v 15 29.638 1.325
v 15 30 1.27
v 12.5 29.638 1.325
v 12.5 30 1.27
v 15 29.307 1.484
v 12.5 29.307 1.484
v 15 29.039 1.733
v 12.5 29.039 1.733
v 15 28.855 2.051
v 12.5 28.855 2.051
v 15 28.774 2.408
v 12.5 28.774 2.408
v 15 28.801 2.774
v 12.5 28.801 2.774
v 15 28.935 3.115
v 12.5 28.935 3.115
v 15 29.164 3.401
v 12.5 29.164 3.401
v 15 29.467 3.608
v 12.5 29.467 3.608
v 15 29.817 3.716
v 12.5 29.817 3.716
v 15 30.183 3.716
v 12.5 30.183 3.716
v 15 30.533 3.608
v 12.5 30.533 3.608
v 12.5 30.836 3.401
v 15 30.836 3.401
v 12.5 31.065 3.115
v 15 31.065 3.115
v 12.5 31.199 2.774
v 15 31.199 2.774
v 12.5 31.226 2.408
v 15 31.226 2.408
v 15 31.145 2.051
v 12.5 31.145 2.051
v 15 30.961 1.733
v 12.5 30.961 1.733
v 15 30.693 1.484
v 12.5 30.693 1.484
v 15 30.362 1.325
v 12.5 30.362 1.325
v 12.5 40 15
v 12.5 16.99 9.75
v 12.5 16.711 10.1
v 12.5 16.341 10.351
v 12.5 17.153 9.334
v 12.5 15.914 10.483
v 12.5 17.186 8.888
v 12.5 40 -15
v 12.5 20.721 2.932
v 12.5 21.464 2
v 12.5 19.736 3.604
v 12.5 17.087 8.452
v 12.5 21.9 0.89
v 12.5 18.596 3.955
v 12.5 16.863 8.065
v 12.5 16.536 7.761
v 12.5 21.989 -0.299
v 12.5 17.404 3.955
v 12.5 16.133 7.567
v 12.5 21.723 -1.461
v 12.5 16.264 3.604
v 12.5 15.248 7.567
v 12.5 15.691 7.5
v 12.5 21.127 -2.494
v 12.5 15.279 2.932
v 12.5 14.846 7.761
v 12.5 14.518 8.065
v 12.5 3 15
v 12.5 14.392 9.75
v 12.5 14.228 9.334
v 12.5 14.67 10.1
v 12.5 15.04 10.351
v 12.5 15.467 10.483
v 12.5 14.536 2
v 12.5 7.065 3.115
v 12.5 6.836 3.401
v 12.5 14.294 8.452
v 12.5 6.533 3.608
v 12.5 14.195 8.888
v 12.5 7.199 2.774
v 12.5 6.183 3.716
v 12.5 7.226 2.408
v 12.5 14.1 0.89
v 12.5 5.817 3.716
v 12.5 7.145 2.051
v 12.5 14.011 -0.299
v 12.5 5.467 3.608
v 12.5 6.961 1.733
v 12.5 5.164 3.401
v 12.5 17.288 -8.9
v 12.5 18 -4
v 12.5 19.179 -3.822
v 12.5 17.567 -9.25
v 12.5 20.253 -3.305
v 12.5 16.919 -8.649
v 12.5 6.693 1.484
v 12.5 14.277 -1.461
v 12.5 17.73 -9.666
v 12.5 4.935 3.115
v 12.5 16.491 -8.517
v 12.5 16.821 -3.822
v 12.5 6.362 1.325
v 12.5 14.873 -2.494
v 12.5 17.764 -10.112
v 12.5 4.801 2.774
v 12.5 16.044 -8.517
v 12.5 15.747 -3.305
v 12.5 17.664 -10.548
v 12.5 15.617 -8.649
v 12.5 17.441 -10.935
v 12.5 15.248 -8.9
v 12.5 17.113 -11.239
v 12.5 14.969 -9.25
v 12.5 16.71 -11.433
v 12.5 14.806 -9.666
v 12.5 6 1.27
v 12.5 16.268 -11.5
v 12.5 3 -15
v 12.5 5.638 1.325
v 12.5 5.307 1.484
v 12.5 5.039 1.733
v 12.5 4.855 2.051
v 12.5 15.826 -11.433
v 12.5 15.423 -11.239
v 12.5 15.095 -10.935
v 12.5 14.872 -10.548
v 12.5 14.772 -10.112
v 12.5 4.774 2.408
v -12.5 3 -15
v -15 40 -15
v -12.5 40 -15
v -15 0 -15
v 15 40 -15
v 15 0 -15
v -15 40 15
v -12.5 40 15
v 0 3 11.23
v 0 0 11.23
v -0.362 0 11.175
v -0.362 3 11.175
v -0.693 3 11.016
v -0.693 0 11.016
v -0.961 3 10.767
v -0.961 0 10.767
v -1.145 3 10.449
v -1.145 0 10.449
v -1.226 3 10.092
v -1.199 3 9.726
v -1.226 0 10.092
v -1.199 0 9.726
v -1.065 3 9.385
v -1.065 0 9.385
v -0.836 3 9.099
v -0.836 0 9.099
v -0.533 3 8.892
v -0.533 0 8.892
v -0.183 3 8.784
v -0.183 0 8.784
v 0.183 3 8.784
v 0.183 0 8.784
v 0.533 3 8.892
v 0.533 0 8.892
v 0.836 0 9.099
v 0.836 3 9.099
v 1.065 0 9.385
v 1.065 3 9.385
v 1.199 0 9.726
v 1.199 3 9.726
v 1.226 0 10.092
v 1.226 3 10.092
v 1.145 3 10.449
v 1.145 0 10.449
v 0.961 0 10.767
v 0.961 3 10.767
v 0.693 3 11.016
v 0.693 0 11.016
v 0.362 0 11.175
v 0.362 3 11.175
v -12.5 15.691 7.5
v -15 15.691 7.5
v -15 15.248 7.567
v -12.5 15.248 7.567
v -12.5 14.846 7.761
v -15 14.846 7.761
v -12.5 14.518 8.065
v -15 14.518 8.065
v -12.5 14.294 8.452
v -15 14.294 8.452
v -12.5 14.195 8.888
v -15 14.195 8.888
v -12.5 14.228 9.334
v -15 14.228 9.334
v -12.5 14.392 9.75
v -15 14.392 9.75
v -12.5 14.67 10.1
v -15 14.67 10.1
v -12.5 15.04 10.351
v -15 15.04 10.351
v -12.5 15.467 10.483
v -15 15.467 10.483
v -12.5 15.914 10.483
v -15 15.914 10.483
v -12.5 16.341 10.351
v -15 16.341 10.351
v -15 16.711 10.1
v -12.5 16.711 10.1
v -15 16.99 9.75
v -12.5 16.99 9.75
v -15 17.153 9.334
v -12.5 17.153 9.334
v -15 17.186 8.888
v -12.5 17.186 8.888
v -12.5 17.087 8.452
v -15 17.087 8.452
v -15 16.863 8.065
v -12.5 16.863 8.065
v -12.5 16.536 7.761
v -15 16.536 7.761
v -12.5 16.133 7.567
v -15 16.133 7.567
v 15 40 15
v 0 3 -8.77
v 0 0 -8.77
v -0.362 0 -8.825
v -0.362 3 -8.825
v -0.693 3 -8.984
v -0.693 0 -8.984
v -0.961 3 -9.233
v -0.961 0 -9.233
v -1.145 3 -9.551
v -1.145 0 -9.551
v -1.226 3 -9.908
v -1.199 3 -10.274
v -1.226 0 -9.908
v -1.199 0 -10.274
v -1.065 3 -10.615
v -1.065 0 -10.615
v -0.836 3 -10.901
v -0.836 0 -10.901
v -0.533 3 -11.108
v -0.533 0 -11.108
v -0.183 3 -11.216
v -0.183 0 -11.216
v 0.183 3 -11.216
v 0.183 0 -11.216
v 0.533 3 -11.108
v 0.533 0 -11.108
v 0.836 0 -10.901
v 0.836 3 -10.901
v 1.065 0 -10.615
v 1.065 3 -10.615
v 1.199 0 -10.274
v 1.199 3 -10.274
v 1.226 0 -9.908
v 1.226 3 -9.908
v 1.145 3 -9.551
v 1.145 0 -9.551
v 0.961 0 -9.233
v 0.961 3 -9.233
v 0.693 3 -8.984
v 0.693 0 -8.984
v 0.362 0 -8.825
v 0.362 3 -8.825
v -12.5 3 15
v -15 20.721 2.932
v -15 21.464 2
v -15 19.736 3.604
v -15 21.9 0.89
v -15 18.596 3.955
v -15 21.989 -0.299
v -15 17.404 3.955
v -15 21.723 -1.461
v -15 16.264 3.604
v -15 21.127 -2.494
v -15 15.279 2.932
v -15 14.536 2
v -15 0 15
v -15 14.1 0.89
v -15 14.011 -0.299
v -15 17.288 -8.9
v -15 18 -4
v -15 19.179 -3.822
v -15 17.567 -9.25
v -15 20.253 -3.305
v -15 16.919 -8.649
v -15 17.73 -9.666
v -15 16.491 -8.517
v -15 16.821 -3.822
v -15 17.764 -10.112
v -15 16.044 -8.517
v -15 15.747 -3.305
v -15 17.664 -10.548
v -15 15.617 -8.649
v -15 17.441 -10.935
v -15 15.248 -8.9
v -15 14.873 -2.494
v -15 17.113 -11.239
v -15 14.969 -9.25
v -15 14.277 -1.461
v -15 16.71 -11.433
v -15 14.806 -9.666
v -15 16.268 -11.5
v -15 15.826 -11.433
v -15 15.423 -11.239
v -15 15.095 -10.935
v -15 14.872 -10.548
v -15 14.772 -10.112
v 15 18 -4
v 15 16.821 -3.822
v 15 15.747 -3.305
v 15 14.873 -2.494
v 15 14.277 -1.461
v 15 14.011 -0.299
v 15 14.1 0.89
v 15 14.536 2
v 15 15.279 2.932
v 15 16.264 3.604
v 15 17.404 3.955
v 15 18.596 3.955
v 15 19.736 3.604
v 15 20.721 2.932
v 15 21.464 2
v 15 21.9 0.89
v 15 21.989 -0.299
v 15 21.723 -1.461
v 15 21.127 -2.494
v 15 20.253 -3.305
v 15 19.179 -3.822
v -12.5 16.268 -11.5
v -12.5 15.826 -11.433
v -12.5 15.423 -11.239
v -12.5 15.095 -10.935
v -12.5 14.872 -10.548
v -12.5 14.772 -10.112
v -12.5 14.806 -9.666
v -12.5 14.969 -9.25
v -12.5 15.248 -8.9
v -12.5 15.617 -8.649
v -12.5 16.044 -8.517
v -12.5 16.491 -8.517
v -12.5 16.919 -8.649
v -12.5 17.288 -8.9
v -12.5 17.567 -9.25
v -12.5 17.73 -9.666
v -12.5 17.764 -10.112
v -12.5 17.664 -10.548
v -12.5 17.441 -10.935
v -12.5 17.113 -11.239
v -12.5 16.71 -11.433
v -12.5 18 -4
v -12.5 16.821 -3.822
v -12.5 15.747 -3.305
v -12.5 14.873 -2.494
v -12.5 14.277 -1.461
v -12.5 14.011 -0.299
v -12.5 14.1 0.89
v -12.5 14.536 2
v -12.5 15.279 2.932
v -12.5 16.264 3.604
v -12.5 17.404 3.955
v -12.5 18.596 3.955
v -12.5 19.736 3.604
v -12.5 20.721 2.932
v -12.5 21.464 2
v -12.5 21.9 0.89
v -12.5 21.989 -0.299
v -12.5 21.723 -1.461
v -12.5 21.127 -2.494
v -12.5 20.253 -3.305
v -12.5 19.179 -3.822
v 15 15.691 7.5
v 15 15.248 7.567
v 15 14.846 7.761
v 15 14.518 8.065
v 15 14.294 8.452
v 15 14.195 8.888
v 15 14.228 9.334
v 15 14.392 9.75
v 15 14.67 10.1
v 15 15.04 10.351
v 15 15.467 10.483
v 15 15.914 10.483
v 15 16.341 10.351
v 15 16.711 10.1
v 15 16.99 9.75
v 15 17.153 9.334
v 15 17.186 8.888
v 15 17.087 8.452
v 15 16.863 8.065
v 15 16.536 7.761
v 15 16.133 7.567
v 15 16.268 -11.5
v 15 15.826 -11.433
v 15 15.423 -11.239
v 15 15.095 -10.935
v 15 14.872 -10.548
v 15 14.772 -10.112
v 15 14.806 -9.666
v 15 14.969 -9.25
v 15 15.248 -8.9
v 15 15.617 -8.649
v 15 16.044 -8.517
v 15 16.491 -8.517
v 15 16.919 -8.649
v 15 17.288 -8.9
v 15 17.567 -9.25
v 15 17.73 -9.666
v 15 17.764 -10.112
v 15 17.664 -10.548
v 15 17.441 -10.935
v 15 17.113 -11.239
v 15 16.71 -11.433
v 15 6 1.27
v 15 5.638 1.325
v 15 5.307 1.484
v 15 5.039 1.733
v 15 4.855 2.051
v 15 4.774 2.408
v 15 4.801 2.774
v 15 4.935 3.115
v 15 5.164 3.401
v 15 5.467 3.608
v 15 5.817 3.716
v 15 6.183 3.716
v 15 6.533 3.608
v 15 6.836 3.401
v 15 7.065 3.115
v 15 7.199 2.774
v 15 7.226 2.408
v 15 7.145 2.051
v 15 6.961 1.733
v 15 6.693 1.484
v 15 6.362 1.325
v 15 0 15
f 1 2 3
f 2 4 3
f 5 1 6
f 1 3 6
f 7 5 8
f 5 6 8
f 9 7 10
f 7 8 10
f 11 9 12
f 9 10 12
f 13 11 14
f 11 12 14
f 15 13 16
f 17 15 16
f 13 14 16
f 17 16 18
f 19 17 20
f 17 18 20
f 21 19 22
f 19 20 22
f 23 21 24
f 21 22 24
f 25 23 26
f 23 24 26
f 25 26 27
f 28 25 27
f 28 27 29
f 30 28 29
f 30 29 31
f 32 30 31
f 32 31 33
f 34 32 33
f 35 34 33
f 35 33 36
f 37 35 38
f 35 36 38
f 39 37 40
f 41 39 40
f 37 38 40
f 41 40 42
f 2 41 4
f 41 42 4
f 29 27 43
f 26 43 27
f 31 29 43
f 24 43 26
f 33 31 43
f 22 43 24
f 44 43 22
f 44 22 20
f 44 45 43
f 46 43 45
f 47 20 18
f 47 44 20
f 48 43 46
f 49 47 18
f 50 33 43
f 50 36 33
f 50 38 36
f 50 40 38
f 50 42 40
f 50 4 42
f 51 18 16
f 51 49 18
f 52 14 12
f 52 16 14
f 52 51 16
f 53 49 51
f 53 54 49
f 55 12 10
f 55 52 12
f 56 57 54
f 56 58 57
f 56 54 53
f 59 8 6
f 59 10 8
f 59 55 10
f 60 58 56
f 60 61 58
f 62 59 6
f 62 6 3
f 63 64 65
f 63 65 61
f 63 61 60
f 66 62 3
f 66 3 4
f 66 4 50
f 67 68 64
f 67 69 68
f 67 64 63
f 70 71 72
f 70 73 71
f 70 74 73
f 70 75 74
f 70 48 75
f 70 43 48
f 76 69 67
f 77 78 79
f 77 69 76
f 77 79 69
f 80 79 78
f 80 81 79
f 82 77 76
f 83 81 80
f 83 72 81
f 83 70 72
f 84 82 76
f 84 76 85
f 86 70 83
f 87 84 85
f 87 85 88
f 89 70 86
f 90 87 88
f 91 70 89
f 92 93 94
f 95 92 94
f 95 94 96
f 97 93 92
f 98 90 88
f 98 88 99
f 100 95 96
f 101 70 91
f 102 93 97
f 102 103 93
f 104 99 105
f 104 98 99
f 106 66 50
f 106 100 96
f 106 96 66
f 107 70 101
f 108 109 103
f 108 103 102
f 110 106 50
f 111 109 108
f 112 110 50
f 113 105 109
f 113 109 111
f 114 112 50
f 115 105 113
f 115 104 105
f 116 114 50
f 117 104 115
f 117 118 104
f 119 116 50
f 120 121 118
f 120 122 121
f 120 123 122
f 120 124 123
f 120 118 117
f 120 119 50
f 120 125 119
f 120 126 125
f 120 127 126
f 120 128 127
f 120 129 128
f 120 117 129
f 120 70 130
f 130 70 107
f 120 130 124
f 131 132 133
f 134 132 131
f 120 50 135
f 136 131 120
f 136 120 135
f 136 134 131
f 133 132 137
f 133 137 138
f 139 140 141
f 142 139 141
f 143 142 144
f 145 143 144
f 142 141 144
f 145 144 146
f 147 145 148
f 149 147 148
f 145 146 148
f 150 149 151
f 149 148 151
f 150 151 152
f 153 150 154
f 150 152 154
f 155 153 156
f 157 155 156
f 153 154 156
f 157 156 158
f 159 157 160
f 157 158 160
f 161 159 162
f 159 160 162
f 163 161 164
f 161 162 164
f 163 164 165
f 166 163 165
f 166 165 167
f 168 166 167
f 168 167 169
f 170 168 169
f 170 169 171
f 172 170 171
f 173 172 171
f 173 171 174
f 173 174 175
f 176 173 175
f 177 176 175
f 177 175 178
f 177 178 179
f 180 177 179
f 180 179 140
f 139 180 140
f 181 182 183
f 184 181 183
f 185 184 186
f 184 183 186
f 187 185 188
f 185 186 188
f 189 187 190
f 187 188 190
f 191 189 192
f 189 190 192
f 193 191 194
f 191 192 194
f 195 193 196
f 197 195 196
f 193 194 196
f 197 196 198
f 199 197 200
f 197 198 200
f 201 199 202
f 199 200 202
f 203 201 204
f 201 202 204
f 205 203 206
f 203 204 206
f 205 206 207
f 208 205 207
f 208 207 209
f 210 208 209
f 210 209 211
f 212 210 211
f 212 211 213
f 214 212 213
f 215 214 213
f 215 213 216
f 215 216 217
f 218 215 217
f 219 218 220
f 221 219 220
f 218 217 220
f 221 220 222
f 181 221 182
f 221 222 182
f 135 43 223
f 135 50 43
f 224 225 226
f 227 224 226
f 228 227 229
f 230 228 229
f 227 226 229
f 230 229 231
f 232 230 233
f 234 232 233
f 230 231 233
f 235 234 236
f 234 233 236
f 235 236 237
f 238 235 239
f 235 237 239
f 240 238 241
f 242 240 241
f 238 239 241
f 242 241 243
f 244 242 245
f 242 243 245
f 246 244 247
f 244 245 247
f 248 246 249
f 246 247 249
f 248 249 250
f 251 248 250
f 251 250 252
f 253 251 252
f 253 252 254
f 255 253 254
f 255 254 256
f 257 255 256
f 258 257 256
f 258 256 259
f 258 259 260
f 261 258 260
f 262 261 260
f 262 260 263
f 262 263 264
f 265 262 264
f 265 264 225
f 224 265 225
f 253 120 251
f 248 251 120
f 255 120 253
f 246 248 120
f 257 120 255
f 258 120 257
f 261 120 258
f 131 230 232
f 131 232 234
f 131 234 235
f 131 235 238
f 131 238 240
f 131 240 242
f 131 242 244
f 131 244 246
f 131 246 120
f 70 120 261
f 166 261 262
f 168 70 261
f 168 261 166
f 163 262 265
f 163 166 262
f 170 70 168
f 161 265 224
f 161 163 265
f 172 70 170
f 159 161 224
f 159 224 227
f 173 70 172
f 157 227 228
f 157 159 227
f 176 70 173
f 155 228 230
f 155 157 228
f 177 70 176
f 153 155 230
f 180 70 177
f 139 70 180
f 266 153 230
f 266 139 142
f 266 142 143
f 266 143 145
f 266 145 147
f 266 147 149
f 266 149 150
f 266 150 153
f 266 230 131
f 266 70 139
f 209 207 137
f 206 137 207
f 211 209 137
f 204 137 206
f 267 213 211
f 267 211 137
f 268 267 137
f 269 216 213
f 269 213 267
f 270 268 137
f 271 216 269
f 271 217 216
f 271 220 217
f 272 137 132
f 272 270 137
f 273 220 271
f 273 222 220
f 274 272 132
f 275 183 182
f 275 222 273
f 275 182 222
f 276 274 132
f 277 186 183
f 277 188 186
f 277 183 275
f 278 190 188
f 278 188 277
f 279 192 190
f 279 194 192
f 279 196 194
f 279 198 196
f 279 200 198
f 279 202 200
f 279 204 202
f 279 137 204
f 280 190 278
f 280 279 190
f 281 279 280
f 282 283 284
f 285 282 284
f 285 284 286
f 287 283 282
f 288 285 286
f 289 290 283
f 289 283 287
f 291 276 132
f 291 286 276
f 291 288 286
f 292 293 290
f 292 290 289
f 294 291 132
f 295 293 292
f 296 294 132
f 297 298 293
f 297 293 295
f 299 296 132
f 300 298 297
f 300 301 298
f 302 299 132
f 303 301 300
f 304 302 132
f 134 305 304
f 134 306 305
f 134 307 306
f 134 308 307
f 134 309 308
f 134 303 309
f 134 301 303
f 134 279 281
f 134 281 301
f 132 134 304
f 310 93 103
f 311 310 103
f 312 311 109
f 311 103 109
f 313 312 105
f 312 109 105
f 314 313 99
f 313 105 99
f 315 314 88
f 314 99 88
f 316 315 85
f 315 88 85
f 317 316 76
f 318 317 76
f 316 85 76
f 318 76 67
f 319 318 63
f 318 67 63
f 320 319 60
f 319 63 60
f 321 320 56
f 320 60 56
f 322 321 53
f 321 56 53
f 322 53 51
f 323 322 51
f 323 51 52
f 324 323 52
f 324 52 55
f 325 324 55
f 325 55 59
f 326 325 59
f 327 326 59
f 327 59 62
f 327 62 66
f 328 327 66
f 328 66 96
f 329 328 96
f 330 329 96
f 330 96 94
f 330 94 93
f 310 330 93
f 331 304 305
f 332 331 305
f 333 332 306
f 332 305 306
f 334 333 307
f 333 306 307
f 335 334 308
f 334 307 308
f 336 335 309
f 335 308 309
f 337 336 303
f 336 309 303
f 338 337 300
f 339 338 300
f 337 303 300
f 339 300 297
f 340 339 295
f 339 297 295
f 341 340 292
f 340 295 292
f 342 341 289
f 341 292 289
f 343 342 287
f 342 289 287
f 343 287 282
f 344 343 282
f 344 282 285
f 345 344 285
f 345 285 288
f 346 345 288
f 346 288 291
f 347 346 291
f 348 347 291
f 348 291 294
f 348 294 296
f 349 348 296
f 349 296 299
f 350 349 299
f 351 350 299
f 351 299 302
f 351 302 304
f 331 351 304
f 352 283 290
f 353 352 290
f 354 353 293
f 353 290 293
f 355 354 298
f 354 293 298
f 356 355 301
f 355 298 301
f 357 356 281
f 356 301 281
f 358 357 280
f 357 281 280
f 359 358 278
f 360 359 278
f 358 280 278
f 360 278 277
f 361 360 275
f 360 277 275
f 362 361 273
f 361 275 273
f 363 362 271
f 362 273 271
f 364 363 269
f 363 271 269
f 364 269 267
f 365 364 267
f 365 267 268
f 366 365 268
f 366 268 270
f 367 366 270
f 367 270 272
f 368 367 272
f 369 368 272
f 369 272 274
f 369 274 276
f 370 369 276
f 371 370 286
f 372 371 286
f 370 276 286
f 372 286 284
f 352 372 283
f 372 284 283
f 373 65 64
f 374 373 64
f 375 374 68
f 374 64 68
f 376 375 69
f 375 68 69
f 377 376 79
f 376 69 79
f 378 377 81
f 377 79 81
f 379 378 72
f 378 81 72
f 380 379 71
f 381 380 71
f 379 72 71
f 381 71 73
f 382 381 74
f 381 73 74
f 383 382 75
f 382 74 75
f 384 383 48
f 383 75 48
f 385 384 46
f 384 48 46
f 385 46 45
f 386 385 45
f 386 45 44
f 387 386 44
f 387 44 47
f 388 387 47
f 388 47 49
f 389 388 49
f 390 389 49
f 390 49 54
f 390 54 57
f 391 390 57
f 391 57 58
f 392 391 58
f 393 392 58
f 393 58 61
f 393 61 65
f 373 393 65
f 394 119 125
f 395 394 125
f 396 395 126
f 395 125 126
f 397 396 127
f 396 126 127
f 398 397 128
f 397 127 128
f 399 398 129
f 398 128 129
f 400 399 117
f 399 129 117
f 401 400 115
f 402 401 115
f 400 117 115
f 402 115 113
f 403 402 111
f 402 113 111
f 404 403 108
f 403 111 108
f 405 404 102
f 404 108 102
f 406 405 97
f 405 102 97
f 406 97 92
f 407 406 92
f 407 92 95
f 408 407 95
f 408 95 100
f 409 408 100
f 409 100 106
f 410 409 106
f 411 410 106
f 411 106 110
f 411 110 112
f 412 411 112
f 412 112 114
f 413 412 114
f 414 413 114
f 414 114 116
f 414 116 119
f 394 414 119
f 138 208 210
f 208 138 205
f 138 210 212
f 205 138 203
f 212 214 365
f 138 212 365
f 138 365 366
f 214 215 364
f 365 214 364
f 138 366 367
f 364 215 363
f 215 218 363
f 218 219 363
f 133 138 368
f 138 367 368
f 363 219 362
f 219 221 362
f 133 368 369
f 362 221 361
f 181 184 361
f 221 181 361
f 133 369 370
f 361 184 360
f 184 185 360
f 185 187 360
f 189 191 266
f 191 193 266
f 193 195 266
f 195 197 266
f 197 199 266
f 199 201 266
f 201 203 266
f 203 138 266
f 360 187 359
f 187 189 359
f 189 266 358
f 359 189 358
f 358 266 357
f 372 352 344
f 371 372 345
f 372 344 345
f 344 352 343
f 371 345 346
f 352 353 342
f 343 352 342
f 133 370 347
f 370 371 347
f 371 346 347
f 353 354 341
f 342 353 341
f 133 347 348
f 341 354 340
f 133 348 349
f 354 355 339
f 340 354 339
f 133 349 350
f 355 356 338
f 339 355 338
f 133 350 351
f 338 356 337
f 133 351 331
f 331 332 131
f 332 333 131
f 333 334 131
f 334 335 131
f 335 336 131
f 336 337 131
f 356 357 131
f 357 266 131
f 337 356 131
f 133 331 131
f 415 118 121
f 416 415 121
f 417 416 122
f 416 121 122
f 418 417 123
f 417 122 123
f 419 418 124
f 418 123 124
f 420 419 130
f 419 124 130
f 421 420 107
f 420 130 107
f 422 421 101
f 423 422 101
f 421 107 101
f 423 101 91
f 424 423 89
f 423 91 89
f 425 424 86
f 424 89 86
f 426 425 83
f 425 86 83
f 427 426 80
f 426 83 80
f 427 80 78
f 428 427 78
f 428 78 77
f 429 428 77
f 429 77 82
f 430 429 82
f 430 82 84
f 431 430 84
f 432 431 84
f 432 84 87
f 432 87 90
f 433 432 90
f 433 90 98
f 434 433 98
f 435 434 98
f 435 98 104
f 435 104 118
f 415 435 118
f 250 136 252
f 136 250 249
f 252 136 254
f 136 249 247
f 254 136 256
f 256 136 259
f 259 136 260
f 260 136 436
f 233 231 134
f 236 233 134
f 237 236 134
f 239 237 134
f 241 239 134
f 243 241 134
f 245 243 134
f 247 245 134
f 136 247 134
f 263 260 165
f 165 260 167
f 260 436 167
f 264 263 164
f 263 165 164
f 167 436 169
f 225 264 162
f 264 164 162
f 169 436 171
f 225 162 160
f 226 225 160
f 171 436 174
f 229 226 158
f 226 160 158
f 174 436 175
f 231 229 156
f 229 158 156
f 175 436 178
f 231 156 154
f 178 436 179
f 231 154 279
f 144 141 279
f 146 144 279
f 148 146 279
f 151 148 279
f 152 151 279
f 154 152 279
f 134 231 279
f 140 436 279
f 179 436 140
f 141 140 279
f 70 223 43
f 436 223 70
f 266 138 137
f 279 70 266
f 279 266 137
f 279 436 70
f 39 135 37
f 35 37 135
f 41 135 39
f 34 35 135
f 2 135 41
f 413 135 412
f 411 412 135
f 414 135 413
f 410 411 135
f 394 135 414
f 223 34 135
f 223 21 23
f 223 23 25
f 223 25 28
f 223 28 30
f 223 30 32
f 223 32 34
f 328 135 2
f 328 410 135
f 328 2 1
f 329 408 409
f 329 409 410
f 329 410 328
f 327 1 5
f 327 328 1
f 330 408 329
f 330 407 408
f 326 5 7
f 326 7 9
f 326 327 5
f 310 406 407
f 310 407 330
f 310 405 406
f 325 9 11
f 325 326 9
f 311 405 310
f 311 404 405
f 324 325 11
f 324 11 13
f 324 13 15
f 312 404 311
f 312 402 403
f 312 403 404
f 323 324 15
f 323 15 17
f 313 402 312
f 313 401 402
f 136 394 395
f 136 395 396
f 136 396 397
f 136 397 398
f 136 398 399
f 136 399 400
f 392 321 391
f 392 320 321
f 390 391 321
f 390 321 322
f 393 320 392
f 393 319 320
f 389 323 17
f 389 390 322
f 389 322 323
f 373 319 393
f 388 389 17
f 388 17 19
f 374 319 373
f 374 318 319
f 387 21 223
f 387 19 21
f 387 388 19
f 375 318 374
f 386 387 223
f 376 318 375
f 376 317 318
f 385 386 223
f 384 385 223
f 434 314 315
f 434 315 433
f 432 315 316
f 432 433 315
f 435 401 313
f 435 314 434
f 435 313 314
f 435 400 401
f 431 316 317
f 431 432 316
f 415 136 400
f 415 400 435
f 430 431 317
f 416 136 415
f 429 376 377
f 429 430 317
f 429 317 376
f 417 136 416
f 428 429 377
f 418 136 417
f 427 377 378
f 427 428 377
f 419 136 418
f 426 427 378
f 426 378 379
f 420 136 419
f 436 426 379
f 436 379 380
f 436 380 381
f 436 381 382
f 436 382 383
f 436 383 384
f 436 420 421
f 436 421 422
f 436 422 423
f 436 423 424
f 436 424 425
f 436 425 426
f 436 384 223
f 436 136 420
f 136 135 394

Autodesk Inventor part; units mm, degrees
ref_plane "YZ Plane" through (0, 0, 0) normal (1, 0, 0) x (0, 1, 0)
ref_plane "XZ Plane" through (0, 0, 0) normal (0, 1, 0) x (-1, 0, 0)
sketch "スケッチ1" plane through (0, 0, 0) normal (0, 1, 0) x (-1, 0, 0)
  line L0 (15, -15) -> (-15, -15)
  line L1 (-15, -15) -> (-15, 15)
  line L2 (-15, 15) -> (15, 15)
  line L3 (15, 15) -> (15, -15)
  line L4 (-15, 15) -> (15, -15) construction
  line L5 (-15, -15) -> (15, 15) construction
  point P0 (0, 0)
  point P1 (0, 0)
  dimension "d0" = 30
  dimension "d1" = 30
extrude "押し出し1" add sketch "スケッチ1" along normal blind 3
sketch "スケッチ2" plane through (0, 3, 0) normal (0, 1, 0) x (1, 0, 0)
  line L0 (-15, -15) -> (15, -15) projected
  line L1 (15, -15) -> (15, 15) projected
  line L2 (15, 15) -> (-15, 15) projected
  line L3 (-15, 15) -> (-15, -15) projected
  line L4 (-15, -15) -> (15, -15) projected
  line L5 (-15, -15) -> (-12.5, -15)
  line L6 (-12.5, -15) -> (-12.5, 15)
  line L7 (-12.5, 15) -> (-15, 15)
  line L8 (-15, 15) -> (-15, -15)
  line L9 (15, -15) -> (15, 15) projected
  line L10 (15, -15) -> (12.5, -15)
  line L11 (12.5, -15) -> (12.5, 15)
  line L12 (12.5, 15) -> (15, 15)
  line L13 (15, 15) -> (15, -15)
  line L14 (15, 15) -> (-15, 15) projected
  point P0 (0, 0)
  point P1 (-12.5, 15)
  dimension "d4" = 2.5
  dimension "d5" = 2.5
extrude "押し出し2" add sketch "スケッチ2" along normal blind 40 from surface at -3 contours L3 L2 L6 L0 | L11 L2 L1 L0
sketch "スケッチ3" plane through (15, 0, 15) normal (1, 0, 0) x (0, 0, -1)
  line L0 (0, 3) -> (30, 3) projected
  line L1 (15, 18) -> (30, 18) construction
  line L2 (30, 40) -> (30, 3) construction
  line L3 (15, 18) -> (-10.0782, 18) construction
  point P0 (15, 0)
  dimension "d8" = 15
  dimension "d50" = 15
hole "穴1" at (15, 18, 0) direction (-1, 0, 0) diameter 8 end through all
sketch "スケッチ6" plane through (0, 3, 0) normal (0, 1, 0) x (1, 0, 0)
  line L0 (12.5, 15) -> (-12.5, 15) projected
  point P0 (0, 0)
  point P1 (0, 10)
  point P2 (0, -10)
  point P3 (0, 15)
  dimension "d41" = 5
  dimension "d42" = 20
hole "穴3" at (0, 3, -10) at (0, 3, 10) direction (0, -1, 0) diameter 2.459 depth 3 thread size "M3x0.5" class "6H" standard "ISO Metric profile"
sketch "スケッチ8" plane through (15, 0, 15) normal (1, 0, 0) x (0, 0, -1)
  circle A0 centre (15, 18) radius 4 projected
  line L0 (12.5, 30) -> (12.5, 6) construction
  point P0 (15, 0)
  dimension "d56" = 24
  dimension "d57" = 12
  dimension "d58" = 2.5
hole "穴4" at (15, 30, 2.5) at (15, 6, 2.5) direction (-1, 0, 0) diameter 2.459 depth 2.5 thread size "M3x0.5" class "6H" standard "ISO Metric profile"
sketch "スケッチ9" plane through (15, 0, 15) normal (1, 0, 0) x (0, 0, -1)
  circle A0 centre (15, 18) radius 4 projected
  line L0 (0, 18) -> (15, 18)
  line L1 (0, 0) -> (0, 40) projected
  line L2 (30, 0) -> (30, 40) projected
  line L3 (15, 18) -> (-5.0402, 29.5702)
  line L4 (15, 18) -> (33.9658, 28.9499)
  circle A1 centre (6, 15.6906) radius 1.5
  circle A2 centre (25, 16.2679) radius 1.5
  line L5 (12.5, 13.6699) -> (-5.7345, 24.1976)
  line L6 (17.5, 13.6699) -> (25.6852, 18.3956)
  point P0 (15, 0)
  dimension "d70" = 3
  dimension "d71" = 3
  dimension "d72" = 6
  dimension "d73" = 5
  dimension "d83" = 5
  dimension "d84" = 5
  dimension "d85" = 30
  dimension "d86" = 30
hole "穴5" at (15, 15.6906, 9) at (15, 16.2679, -10) direction (-1, 0, 0) diameter 3 depth 30
ref_plane "作業平面1" through (0, 3, 15) normal (1, 0, 0) x (0, 0, -1)
properties part number "hand1" material "アルミニウム 6061"
